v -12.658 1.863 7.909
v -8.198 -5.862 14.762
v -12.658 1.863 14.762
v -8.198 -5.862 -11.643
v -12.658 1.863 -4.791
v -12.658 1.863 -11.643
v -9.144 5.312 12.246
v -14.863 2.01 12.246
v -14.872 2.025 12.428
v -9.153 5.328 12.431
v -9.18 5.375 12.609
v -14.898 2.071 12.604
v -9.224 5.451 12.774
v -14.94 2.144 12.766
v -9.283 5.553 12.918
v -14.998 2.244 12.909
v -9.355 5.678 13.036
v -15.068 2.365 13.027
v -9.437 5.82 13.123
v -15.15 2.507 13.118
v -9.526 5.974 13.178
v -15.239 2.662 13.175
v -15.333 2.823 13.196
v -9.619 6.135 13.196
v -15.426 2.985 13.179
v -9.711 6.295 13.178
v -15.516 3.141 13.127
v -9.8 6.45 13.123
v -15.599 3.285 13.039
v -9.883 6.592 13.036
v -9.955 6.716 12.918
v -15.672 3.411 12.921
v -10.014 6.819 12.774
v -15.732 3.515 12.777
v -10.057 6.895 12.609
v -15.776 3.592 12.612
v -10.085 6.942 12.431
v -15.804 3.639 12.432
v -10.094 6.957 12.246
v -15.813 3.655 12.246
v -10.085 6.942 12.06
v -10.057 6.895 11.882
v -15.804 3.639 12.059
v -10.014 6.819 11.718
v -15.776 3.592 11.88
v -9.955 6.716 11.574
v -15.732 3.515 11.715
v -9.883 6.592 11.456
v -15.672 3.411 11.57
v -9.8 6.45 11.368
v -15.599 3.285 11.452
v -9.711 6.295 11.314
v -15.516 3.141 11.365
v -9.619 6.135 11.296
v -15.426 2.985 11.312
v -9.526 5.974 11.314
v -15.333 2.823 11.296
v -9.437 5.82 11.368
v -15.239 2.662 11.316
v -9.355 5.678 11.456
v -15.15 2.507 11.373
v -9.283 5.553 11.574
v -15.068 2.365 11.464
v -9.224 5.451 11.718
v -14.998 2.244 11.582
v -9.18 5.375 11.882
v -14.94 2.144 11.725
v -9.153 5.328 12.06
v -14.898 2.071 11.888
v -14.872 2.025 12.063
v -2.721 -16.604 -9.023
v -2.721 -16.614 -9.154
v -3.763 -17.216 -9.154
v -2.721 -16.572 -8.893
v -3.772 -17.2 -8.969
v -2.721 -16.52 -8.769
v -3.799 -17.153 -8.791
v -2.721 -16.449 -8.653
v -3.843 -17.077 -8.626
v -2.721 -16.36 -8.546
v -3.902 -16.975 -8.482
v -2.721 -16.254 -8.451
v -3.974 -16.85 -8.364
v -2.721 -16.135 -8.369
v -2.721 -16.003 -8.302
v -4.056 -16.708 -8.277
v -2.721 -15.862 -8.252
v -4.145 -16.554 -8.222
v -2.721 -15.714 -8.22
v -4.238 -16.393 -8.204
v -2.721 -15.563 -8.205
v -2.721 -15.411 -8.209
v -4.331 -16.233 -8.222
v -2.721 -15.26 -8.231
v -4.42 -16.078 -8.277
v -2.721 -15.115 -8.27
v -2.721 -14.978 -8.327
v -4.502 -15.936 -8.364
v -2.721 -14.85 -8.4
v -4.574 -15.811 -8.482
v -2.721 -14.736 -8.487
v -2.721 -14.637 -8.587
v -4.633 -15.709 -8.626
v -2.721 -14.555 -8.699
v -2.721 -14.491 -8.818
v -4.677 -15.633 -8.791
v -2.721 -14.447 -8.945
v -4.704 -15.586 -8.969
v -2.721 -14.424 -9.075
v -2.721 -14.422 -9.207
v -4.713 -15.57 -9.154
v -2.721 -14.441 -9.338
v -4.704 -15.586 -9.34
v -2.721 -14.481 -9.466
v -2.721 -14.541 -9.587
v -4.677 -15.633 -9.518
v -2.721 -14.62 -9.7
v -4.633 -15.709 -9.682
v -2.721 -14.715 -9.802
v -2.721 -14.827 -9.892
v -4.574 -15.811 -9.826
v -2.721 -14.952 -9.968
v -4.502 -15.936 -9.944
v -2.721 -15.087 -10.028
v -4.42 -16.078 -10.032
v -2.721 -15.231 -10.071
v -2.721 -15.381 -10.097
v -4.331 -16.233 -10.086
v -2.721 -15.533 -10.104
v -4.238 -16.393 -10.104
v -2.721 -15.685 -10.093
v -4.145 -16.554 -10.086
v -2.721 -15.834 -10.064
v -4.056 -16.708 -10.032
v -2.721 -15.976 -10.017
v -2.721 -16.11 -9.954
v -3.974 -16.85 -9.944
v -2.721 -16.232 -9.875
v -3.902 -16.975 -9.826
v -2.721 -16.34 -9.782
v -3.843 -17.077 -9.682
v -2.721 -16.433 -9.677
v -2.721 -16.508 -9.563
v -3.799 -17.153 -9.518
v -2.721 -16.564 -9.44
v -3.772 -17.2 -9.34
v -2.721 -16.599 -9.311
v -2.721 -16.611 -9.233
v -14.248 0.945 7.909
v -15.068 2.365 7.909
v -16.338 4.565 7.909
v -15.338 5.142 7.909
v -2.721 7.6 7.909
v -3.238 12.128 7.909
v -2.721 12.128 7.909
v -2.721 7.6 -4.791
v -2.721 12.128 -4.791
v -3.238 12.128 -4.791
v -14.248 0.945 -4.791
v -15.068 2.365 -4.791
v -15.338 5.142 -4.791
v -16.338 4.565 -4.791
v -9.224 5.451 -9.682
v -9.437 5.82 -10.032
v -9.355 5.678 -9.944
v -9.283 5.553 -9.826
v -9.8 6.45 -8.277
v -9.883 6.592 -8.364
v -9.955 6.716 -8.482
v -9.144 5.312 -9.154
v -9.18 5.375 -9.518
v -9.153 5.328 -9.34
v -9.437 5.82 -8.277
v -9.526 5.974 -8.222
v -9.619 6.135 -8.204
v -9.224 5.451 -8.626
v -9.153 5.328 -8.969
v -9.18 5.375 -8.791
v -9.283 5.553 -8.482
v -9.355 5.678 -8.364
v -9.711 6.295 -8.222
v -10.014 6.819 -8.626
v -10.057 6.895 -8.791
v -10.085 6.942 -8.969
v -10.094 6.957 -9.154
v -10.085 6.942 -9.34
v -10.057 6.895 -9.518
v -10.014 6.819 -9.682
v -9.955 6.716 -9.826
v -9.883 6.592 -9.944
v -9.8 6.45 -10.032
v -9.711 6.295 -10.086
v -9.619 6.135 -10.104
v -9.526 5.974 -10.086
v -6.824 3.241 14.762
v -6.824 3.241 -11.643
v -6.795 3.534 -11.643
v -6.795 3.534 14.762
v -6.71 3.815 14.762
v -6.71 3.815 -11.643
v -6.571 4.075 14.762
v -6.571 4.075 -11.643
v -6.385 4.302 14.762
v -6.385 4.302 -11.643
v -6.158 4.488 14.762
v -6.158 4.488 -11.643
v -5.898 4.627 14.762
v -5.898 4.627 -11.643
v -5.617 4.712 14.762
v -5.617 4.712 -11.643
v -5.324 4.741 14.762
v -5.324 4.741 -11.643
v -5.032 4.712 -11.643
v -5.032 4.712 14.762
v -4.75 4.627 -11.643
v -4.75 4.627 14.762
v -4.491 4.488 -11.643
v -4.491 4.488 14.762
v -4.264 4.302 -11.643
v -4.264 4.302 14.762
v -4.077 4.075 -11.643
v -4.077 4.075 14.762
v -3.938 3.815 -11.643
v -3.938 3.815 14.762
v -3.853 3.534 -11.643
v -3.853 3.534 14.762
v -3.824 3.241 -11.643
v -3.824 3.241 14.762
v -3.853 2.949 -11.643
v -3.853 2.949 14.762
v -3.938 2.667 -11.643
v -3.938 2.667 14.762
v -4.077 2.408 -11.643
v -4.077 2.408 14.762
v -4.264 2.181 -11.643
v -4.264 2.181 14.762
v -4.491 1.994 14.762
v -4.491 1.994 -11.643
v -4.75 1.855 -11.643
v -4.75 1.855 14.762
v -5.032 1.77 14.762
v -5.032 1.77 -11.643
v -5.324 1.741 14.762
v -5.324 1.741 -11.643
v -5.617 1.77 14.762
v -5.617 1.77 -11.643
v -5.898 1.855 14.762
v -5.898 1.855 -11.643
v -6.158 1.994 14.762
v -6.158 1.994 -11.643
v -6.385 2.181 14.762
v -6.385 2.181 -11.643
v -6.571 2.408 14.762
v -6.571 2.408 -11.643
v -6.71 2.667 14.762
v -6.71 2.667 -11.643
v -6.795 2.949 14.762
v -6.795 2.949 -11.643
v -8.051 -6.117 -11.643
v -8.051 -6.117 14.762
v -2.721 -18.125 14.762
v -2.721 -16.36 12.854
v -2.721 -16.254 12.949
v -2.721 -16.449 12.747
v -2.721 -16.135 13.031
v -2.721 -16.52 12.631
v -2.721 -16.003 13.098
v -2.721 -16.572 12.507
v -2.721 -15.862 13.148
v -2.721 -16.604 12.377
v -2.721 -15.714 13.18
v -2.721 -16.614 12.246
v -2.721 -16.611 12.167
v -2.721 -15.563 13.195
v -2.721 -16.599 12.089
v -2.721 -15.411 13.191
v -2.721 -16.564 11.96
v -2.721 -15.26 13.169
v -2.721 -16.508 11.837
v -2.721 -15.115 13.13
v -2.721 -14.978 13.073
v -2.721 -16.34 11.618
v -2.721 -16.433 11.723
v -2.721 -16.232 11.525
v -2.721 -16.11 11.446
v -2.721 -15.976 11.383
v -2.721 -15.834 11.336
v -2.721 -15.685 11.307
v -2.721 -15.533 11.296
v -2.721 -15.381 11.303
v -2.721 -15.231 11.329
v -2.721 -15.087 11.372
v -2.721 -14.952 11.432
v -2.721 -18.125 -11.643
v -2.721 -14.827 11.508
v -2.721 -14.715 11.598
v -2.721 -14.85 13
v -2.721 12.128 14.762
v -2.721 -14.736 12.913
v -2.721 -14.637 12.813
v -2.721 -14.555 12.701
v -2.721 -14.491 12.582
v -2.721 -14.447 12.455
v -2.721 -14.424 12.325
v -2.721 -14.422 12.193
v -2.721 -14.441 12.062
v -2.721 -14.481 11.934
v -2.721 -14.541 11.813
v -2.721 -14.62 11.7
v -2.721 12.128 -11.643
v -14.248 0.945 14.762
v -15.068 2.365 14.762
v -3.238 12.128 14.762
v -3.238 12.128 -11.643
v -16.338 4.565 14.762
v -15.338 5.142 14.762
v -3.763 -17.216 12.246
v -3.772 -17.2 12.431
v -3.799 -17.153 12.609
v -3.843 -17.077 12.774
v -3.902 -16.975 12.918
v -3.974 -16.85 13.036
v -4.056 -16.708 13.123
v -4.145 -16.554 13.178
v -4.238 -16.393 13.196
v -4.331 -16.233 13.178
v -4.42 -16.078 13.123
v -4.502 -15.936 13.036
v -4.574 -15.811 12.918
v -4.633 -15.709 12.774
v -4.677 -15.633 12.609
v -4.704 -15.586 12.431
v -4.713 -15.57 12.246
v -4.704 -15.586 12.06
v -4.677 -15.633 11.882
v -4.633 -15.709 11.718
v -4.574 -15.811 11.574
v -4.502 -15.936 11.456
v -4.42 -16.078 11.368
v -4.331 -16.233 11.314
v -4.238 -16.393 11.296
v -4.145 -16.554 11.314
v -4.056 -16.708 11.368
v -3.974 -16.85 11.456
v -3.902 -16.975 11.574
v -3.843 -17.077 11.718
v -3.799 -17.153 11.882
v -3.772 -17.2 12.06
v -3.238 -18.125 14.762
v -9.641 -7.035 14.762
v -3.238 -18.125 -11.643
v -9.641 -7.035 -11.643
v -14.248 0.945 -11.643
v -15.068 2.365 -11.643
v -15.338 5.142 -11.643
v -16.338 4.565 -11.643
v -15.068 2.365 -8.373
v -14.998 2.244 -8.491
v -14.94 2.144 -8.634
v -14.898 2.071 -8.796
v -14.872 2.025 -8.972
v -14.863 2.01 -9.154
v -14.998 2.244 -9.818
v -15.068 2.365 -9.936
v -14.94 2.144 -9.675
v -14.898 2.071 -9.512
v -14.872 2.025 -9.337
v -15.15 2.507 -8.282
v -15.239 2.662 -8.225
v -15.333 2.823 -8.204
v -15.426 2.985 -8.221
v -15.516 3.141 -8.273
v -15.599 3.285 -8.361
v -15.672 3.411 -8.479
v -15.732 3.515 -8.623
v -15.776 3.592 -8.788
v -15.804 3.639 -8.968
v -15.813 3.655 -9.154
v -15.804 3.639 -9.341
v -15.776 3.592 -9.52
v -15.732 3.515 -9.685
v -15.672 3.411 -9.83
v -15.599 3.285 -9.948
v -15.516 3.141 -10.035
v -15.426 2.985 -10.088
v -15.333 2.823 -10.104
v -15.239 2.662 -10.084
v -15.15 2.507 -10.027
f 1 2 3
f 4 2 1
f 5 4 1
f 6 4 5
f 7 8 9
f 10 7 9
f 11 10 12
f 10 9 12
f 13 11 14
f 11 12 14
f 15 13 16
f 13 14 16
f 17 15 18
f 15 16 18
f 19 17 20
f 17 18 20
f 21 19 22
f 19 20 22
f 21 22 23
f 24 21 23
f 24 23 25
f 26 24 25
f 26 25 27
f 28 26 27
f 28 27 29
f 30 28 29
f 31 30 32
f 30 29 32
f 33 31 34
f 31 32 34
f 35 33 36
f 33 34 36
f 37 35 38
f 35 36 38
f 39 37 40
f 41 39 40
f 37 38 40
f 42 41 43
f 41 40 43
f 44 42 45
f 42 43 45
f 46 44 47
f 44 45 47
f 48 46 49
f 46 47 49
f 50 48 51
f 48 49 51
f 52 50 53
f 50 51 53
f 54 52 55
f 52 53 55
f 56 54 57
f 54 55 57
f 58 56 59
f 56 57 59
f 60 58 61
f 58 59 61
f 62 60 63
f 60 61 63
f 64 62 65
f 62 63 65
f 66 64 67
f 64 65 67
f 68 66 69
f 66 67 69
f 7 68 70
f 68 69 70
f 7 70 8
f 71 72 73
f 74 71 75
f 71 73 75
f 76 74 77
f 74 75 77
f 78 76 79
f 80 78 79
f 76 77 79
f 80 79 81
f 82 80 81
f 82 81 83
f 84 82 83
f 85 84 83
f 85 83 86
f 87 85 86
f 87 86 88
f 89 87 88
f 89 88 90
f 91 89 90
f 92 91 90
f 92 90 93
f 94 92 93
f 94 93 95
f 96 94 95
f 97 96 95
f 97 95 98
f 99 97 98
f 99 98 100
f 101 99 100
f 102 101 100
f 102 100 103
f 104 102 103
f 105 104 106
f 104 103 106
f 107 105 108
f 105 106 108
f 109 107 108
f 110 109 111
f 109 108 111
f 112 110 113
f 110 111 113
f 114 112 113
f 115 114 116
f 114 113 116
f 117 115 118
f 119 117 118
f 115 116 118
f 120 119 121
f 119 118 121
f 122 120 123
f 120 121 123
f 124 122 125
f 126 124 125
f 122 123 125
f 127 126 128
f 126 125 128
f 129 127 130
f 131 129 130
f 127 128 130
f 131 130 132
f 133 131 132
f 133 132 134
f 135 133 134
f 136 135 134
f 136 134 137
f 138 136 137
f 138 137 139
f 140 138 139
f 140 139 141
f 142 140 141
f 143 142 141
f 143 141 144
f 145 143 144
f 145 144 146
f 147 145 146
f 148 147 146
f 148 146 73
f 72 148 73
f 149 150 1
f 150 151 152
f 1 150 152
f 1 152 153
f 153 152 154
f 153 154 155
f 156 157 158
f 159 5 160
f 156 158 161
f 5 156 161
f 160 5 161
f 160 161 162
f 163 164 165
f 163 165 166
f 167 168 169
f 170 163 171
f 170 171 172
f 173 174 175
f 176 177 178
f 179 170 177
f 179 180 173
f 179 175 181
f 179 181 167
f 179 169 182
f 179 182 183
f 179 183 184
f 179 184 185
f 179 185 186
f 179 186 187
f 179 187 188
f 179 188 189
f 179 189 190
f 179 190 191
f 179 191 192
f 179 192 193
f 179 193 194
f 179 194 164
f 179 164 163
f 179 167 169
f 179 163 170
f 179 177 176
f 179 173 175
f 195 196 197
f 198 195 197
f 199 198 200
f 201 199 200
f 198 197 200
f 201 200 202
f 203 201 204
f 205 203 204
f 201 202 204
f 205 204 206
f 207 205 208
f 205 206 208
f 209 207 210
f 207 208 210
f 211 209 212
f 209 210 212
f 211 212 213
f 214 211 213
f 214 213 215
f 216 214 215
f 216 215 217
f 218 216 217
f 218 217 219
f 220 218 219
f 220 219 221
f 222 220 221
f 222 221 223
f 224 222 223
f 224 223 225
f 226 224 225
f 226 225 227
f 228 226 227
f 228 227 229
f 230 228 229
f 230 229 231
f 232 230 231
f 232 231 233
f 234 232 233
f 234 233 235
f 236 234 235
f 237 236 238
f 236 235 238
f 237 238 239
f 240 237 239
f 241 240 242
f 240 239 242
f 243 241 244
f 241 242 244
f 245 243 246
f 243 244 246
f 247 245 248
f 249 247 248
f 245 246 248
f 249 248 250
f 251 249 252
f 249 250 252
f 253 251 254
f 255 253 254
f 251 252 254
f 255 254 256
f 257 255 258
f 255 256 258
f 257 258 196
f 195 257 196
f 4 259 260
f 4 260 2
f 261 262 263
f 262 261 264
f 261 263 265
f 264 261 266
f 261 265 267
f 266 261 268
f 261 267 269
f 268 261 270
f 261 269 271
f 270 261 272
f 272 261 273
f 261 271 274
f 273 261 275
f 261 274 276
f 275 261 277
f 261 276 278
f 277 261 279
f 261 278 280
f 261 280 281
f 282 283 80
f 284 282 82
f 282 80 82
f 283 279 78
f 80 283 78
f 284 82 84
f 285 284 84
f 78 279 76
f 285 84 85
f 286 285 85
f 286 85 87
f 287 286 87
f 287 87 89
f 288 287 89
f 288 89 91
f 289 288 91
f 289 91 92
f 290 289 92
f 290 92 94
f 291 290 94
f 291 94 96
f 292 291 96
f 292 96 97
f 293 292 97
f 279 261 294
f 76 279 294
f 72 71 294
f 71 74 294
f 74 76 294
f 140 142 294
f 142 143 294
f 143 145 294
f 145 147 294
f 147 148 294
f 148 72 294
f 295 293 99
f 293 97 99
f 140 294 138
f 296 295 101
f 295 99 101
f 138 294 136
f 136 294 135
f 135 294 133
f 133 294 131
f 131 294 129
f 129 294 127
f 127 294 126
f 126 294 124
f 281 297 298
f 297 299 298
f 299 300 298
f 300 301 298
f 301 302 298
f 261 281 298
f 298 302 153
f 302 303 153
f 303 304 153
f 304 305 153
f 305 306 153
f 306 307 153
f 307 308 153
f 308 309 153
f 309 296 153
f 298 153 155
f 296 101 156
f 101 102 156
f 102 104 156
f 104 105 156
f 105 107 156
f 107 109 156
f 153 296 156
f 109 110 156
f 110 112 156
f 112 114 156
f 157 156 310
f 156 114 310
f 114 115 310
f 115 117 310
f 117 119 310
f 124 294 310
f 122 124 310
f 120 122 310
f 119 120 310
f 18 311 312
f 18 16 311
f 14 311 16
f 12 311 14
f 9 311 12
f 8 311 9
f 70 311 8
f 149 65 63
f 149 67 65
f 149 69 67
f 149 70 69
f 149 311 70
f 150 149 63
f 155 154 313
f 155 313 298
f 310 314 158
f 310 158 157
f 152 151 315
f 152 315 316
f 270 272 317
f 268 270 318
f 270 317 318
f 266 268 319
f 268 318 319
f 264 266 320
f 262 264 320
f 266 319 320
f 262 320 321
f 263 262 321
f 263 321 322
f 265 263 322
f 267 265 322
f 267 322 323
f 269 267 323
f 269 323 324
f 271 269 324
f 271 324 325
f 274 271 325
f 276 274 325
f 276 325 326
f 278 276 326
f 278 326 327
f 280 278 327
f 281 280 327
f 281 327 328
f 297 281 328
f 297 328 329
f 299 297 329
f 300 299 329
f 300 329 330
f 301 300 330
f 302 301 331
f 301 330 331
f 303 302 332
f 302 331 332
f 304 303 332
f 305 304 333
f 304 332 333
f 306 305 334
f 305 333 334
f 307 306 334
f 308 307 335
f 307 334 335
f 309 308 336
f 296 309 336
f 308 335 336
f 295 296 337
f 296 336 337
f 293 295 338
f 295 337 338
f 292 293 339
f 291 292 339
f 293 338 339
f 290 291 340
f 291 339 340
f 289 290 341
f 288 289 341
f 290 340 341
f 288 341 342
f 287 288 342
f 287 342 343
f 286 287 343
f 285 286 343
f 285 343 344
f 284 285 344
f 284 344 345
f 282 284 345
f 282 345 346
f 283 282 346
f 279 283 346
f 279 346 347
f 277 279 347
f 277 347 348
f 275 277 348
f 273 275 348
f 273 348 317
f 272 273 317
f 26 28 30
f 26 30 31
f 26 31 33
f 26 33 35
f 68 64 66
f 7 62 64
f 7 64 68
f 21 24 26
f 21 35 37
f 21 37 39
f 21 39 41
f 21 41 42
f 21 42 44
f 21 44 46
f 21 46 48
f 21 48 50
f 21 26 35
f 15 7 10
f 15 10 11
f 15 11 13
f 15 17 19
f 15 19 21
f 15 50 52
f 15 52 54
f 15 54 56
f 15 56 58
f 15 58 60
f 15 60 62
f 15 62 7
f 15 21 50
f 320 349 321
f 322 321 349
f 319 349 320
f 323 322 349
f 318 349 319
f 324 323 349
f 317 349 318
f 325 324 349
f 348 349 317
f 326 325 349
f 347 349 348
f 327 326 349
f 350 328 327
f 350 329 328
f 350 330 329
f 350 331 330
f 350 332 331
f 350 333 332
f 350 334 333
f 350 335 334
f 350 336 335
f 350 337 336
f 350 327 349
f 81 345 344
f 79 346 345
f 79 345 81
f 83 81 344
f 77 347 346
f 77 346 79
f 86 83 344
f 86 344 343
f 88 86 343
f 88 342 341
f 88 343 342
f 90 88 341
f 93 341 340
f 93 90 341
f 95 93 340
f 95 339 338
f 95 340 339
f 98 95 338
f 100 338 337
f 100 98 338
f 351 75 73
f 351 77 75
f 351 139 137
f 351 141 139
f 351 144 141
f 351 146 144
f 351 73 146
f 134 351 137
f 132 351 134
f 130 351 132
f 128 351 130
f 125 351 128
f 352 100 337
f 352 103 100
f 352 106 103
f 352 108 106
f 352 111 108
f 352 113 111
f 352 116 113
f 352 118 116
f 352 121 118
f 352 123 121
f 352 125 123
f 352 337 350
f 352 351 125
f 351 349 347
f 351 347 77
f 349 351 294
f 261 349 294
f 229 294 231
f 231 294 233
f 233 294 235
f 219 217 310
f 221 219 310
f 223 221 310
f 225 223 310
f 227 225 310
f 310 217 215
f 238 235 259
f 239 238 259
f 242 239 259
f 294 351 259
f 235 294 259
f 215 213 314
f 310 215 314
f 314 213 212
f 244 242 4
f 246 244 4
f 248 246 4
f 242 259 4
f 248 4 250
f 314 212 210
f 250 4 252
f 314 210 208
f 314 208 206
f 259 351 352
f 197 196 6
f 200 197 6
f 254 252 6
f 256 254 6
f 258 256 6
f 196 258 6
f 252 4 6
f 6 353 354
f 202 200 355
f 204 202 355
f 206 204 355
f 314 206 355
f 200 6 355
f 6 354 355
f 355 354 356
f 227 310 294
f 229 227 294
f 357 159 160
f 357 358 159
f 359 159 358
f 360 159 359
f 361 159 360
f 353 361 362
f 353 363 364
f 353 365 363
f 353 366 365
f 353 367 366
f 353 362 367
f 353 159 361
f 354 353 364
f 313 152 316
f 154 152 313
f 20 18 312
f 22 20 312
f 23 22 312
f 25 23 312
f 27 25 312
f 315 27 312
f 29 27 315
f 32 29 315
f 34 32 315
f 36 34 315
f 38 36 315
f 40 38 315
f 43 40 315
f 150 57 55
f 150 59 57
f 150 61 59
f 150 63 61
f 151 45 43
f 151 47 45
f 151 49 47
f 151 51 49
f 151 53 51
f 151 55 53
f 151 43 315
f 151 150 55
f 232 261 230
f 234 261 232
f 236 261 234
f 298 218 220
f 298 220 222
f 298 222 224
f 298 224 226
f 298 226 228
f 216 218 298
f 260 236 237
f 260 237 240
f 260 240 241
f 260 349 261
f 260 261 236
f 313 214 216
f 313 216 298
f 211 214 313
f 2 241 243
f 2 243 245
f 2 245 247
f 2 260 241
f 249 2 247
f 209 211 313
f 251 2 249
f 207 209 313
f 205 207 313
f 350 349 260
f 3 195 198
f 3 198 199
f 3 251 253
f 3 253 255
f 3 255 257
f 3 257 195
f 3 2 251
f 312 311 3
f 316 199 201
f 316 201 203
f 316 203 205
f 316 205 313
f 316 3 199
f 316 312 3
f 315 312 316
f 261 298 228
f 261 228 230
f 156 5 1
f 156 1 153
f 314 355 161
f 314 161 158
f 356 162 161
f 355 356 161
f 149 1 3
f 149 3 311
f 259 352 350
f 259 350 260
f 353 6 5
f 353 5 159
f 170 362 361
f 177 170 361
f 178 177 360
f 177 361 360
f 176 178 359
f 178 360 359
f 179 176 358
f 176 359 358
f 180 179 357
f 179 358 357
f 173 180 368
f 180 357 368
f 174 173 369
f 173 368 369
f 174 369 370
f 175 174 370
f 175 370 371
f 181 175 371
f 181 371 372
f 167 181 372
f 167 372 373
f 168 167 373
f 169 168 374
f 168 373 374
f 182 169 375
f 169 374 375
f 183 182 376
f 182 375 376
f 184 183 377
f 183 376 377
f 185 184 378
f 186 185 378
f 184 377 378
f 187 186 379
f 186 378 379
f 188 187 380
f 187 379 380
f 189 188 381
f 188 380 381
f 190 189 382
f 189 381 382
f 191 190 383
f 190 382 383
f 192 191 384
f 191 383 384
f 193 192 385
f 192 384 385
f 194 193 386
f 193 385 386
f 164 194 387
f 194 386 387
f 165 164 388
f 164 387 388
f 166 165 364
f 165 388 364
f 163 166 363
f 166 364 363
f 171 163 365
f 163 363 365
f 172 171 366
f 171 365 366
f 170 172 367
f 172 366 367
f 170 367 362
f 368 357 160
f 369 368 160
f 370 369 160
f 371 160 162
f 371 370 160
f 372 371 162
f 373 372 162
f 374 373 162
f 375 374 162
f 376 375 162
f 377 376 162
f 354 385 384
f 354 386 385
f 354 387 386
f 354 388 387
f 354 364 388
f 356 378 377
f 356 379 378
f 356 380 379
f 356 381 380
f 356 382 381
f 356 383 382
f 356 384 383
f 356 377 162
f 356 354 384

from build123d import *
from OCP.BRepAlgoAPI import BRepAlgoAPI_Cut
from OCP.TopTools import TopTools_ListOfShape

# Parameters (mm, degrees)
BOSS_EXTRUDE1_DEPTH      = 11.938
BOSS_EXTRUDE1_DEPTH_BACK = 18.12511
SKETCH1_W                = 6.216067572
SKETCH1_H                = 27.404994669
BOSS_EXTRUDE2_DEPTH      = 27.404995
CUT_EXTRUDE1_DEPTH       = 4.179688
SKETCH4_R                = 0.95
CUT_EXTRUDE2_DEPTH       = 6.604
SKETCH7_W                = 5.699381266
SKETCH7_H                = 30.253154106
CUT_EXTRUDE3_DEPTH       = 31.242
SKETCH8_R                = 1.5
CUT_EXTRUDE4_DEPTH       = 32.004
SKETCH9_W                = 0.5
SKETCH9_H                = 26.458343153
CUT_EXTRUDE5_DEPTH       = 20


with BuildPart() as part:
    # Sketch1 → Boss-Extrude1 (new, two sides: drawn at the far end of the back side and taken through both)
    with BuildSketch(Plane(origin=(0, 0, 0), x_dir=(1, 0, 0), z_dir=(0, 1, 0)).offset(-BOSS_EXTRUDE1_DEPTH_BACK)):
        with Locations((-0.12984965, -1.559314439)):
            Rectangle(SKETCH1_W, SKETCH1_H)
    extrude(amount=BOSS_EXTRUDE1_DEPTH + BOSS_EXTRUDE1_DEPTH_BACK)

    # Sketch2 → Boss-Extrude2 (add)
    with BuildSketch(Plane(origin=(0, 0, -12.143182896), x_dir=(-1, 0, 0), z_dir=(0, 0, -1))):
        Polygon((15.337816326, 5.142144986), (3.237883436, 12.128044498), (-2.978184136, 12.128044498), (-2.978184136, 11.938), (3.237883436, 11.938), (3.237883436, -18.125109608), (9.640760589, -7.035001064), (8.050552579, -6.116894042), (8.197675426, -5.862069796), (12.657832776, 1.863149344), (14.248040785, 0.945042321), (15.067883436, 2.365051446), (16.337883436, 4.564755971), align=None)
    extrude(amount=-BOSS_EXTRUDE2_DEPTH)

    # Sketch3 → Cut-Extrude1 (cut)
    with BuildSketch(Plane(origin=(-6.061068176, 10.498078028, 0), x_dir=(0.866025403784441, 0.49999999999999606, 0), z_dir=(-0.49999999999999606, 0.866025403784441, 0))):
        Polygon((-11.866644114, -1.559314438), (-11.866644114, -7.909314438), (3.259932939, -7.909314438), (8.643205368, -7.909314438), (8.643205368, 4.790685562), (3.259932939, 4.790685562), (-11.866644114, 4.790685562), align=None)
    extrude(amount=-CUT_EXTRUDE1_DEPTH, mode=Mode.SUBTRACT)

    # Sketch4 → Cut-Extrude2 (cut)
    with BuildSketch(Plane(origin=(-10.27681526, -5.933322057, 0), x_dir=(0, 0, 1), z_dir=(-0.8660254037844423, -0.49999999999999406, 0))):
        with Locations(Location((12.245811773, 10.122136351, 0), (0, 0, 270))):
            Circle(SKETCH4_R)
        with Locations(Location((-9.154188227, 10.122136351, 0), (0, 0, 270))):
            Circle(SKETCH4_R)
        with Locations(Location((-9.154188227, -12.077863649, 0), (0, 0, 270))):
            Circle(SKETCH4_R)
        with Locations(Location((12.245811773, -12.077863649, 0), (0, 0, 270))):
            Circle(SKETCH4_R)
    extrude(amount=-CUT_EXTRUDE2_DEPTH, mode=Mode.SUBTRACT)


with BuildPart() as cut_extrude3_tool:
    # Sketch7 → Cut-Extrude3 (new body)
    with BuildSketch(Plane(origin=(0, 0, -12.143182896), x_dir=(-1, 0, 0), z_dir=(0, 0, -1))):
        with Locations((-0.128493503, -2.998532555)):
            Rectangle(SKETCH7_W, SKETCH7_H)
    extrude(amount=-CUT_EXTRUDE3_DEPTH)


with BuildPart() as part_1:
    add(part.part)

    # Cut-Extrude3: cut by cut_extrude3_tool, with a tolerance
    cut_extrude3_stock = TopTools_ListOfShape()
    cut_extrude3_stock.Append(part_1.part.wrapped)
    cut_extrude3_tools = TopTools_ListOfShape()
    cut_extrude3_tools.Append(cut_extrude3_tool.part.wrapped)
    cut_extrude3_cut = BRepAlgoAPI_Cut()
    cut_extrude3_cut.SetArguments(cut_extrude3_stock)
    cut_extrude3_cut.SetTools(cut_extrude3_tools)
    cut_extrude3_cut.SetFuzzyValue(0.00001)
    cut_extrude3_cut.Build()
    add(Compound.cast(cut_extrude3_cut.Shape()).solids(), mode=Mode.REPLACE)

    # Sketch8 → Cut-Extrude4 (cut)
    with BuildSketch(Plane(origin=(0, 0, -12.143182896), x_dir=(-1, 0, 0), z_dir=(0, 0, -1))):
        with Locations((5.32419713, 3.241176343)):
            Circle(SKETCH8_R)
    extrude(amount=-CUT_EXTRUDE4_DEPTH, mode=Mode.SUBTRACT)

    # Sketch9 → Cut-Extrude5 (cut)
    with BuildSketch(Plane(origin=(-10.27681526, -5.933322057, 0), x_dir=(0, 0, 1), z_dir=(-0.8660254037844423, -0.49999999999999406, 0))):
        with Locations((-11.893182896, -1.107035226)):
            Rectangle(SKETCH9_W, SKETCH9_H)
        with Locations((15.011811773, -1.107035226)):
            Rectangle(SKETCH9_W, SKETCH9_H)
    extrude(amount=-CUT_EXTRUDE5_DEPTH, mode=Mode.SUBTRACT)


solid = part_1.part
